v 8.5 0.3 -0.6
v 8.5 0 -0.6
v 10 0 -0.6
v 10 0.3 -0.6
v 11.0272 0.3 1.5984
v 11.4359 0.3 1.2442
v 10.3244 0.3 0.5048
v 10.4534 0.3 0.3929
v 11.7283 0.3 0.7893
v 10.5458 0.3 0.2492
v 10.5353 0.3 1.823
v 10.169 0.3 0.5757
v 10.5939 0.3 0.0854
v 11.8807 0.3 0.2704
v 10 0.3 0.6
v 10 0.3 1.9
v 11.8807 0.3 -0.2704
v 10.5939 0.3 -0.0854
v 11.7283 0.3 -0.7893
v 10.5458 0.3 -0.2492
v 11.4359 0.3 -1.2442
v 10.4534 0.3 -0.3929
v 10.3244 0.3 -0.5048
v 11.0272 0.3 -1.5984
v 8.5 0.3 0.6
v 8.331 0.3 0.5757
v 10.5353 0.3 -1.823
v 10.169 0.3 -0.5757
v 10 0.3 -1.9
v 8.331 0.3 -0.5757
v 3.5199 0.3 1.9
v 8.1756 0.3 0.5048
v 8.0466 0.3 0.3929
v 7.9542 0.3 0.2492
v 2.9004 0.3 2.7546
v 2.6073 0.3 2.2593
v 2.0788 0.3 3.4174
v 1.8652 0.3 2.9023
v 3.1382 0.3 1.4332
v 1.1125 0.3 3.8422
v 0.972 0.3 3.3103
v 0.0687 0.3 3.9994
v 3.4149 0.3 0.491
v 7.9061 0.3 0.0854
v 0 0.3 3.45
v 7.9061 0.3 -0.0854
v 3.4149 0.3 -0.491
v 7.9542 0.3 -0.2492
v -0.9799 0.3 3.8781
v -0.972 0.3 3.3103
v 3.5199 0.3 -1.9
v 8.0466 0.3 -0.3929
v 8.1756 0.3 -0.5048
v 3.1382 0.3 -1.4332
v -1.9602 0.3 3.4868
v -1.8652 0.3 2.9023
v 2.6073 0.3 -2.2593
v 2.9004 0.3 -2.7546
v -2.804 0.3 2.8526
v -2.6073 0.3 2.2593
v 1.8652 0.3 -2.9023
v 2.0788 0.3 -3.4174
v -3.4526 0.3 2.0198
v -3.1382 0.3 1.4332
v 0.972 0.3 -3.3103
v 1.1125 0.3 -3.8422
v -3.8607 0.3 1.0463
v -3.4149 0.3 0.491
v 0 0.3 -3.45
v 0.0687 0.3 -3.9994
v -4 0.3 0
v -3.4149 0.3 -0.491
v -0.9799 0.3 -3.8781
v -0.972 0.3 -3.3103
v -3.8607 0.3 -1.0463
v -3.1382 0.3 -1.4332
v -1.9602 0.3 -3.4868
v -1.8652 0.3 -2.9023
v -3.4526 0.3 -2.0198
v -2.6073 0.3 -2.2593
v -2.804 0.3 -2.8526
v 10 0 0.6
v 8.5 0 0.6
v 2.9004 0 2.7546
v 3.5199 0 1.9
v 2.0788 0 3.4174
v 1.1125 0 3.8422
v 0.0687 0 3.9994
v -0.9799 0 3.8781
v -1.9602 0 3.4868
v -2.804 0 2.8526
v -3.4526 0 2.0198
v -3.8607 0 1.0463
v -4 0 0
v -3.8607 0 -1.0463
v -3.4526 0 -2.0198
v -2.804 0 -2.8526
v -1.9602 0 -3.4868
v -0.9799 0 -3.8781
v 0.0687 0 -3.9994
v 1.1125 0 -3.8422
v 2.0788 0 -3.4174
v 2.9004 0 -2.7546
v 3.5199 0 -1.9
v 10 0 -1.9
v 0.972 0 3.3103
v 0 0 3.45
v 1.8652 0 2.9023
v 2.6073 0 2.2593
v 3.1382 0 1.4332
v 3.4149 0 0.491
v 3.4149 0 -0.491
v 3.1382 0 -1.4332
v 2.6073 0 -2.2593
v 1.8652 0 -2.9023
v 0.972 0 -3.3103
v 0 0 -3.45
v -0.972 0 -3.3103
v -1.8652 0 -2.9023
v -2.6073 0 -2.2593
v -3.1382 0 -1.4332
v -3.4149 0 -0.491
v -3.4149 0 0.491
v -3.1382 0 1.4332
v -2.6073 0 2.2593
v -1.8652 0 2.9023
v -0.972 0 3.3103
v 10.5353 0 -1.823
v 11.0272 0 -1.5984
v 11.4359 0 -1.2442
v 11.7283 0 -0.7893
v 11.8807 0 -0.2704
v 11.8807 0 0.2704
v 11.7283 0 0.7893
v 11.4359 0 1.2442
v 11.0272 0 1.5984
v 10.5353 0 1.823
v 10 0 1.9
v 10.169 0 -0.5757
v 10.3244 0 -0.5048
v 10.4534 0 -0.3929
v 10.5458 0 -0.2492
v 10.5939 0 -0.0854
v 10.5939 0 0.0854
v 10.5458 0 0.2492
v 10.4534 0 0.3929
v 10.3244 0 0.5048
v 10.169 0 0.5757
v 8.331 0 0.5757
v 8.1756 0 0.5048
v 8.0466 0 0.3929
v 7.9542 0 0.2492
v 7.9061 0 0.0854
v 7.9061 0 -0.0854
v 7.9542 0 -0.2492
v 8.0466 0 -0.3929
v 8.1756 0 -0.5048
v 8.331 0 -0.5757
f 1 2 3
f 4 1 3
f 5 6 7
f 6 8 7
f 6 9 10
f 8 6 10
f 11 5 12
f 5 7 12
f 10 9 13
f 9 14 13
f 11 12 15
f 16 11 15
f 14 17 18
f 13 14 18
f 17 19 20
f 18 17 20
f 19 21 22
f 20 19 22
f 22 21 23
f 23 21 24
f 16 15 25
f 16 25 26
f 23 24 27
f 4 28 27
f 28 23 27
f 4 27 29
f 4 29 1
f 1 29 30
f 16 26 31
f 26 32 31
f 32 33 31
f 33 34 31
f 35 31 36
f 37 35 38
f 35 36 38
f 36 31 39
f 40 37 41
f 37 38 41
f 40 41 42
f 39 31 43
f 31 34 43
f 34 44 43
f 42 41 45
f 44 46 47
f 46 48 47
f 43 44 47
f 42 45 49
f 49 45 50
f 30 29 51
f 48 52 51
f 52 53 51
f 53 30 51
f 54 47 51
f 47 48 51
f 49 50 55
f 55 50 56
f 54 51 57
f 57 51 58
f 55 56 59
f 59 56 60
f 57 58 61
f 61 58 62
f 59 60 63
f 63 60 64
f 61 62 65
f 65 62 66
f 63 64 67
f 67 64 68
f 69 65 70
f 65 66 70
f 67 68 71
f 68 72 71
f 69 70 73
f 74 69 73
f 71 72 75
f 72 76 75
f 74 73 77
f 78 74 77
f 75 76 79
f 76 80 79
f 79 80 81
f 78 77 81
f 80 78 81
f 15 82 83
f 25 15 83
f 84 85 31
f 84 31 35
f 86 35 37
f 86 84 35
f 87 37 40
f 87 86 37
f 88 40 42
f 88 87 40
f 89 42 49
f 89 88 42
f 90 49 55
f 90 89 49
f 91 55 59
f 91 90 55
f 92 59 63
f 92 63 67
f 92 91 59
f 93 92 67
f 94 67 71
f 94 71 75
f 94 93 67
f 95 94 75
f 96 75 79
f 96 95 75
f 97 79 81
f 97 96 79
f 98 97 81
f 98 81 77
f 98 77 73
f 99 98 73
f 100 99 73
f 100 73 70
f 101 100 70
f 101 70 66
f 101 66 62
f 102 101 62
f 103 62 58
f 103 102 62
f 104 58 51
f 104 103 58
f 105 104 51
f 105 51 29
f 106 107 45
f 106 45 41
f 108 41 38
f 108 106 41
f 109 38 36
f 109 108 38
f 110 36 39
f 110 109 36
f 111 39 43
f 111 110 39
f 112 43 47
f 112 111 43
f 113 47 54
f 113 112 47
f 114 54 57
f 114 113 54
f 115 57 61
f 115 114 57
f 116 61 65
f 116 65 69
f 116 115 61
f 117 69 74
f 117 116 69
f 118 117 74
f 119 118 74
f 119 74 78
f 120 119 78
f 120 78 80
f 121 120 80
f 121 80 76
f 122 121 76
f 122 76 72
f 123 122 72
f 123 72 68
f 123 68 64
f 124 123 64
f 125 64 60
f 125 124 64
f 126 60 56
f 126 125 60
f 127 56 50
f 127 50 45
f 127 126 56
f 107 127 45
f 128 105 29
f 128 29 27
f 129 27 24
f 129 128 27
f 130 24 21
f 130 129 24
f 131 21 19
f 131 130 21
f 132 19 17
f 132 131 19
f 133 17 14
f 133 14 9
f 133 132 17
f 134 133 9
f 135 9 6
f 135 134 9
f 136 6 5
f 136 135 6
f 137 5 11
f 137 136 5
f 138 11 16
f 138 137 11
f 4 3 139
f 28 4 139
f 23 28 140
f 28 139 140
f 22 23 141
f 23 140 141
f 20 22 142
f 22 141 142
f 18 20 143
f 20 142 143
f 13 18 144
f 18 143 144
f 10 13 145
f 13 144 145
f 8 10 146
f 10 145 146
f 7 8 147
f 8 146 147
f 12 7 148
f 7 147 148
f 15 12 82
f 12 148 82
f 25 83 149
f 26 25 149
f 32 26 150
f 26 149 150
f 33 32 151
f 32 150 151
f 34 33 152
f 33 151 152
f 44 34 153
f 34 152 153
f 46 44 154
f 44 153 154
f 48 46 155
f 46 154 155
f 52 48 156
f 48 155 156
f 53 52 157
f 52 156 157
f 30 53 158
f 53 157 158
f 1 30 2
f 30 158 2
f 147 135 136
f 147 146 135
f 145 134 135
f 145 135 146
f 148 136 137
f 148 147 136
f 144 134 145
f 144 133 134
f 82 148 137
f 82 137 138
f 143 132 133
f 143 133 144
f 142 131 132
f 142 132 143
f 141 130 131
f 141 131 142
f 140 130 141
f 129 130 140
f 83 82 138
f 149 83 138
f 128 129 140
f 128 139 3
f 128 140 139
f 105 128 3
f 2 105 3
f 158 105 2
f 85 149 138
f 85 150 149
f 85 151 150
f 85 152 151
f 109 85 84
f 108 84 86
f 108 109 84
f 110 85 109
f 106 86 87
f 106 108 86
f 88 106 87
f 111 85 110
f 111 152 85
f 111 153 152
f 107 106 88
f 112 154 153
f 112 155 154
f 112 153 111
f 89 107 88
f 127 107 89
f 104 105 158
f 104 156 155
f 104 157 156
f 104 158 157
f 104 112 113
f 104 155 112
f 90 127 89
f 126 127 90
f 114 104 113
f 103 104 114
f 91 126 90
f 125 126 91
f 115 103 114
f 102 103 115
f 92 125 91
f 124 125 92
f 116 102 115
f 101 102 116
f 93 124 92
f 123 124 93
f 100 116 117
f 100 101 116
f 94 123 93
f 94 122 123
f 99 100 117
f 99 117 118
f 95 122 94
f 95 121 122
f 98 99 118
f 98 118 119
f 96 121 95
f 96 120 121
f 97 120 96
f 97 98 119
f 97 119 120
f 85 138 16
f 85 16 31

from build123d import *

# Parameters (mm, degrees)
SKETCH_1_R      = 3.45
EXTRUDE_1_DEPTH = 0.3


with BuildPart() as part:
    # 草图1 → 凸台-拉伸1 (new body)
    with BuildSketch(Plane(origin=(0, 0, 0), x_dir=(1, 0, 0), z_dir=(0, 1, 0))):
        with BuildLine():
            Line((3.519943181, 1.9), (10, 1.9))
            ThreePointArc((10, 1.9), (11.9, 0), (10, -1.9))
            Line((10, -1.9), (3.519943181, -1.9))
            ThreePointArc((3.519943181, -1.9), (-4, 0), (3.519943181, 1.9))
        make_face()
        with Locations(Location((0, 0, 0), (0, 0, 270))):
            Circle(SKETCH_1_R, mode=Mode.SUBTRACT)
        with BuildLine():
            Line((10, -0.6), (8.5, -0.6))
            ThreePointArc((8.5, -0.6), (7.9, 0), (8.5, 0.6))
            Line((8.5, 0.6), (10, 0.6))
            ThreePointArc((10, 0.6), (10.6, 0), (10, -0.6))
        make_face(mode=Mode.SUBTRACT)
    extrude(amount=EXTRUDE_1_DEPTH)


solid = part.part
